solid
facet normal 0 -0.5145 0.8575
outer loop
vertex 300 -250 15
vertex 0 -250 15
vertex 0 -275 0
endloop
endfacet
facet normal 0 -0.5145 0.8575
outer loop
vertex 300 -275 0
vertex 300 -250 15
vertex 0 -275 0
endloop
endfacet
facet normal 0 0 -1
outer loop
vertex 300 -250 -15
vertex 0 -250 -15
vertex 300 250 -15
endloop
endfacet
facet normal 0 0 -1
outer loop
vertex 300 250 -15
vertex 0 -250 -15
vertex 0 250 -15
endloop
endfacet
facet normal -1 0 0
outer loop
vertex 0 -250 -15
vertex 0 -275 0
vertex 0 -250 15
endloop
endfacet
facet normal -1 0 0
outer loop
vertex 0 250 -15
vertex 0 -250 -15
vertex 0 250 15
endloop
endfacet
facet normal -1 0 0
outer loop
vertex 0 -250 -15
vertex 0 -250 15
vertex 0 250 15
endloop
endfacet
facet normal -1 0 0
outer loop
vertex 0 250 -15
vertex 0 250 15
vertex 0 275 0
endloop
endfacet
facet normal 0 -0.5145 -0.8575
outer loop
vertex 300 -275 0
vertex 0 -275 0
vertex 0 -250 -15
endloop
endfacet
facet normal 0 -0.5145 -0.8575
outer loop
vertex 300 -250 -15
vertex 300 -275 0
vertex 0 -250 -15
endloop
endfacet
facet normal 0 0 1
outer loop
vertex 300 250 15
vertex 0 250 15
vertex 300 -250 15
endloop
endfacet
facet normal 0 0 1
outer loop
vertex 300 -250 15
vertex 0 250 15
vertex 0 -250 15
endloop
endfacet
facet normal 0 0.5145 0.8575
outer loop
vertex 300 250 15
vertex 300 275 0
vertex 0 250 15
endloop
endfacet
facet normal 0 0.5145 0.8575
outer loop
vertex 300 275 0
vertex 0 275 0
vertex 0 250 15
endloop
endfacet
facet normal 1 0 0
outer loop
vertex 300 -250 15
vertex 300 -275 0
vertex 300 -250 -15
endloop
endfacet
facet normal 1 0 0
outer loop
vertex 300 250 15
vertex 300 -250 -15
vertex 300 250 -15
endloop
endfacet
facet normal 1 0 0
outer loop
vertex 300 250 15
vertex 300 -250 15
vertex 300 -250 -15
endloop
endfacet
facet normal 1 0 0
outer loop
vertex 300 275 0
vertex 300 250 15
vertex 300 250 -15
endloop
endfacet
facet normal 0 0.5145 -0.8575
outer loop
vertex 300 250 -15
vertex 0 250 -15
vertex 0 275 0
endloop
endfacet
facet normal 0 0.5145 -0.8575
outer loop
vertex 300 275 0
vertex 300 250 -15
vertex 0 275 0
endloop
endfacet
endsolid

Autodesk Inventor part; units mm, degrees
ref_plane "YZ Plane" through (0, 0, 0) normal (1, 0, 0) x (0, 1, 0)
ref_plane "XZ Plane" through (0, 0, 0) normal (0, 1, 0) x (-1, 0, 0)
ref_plane "XY Plane" through (0, 0, 0) normal (0, 0, 1) x (1, 0, 0)
sketch "草图1" plane through (0, 0, 0) normal (1, 0, 0) x (0, 1, 0)
  point P0 (0, 0)
sketch "草图6" plane through (0, 0, 0) normal (1, 0, 0) x (0, 1, 0)
  line L0 (275, 0) -> (250, 15)
  line L1 (250, 15) -> (-250, 15)
  line L2 (-250, 15) -> (-275, 0)
  line L3 (-275, 0) -> (-250, -15)
  line L4 (-250, -15) -> (250, -15)
  line L5 (250, -15) -> (275, 0)
  point P0 (0, 0)
extrude "拉伸3" add sketch "草图6" along normal blind 300
properties part number "雪弗板"
